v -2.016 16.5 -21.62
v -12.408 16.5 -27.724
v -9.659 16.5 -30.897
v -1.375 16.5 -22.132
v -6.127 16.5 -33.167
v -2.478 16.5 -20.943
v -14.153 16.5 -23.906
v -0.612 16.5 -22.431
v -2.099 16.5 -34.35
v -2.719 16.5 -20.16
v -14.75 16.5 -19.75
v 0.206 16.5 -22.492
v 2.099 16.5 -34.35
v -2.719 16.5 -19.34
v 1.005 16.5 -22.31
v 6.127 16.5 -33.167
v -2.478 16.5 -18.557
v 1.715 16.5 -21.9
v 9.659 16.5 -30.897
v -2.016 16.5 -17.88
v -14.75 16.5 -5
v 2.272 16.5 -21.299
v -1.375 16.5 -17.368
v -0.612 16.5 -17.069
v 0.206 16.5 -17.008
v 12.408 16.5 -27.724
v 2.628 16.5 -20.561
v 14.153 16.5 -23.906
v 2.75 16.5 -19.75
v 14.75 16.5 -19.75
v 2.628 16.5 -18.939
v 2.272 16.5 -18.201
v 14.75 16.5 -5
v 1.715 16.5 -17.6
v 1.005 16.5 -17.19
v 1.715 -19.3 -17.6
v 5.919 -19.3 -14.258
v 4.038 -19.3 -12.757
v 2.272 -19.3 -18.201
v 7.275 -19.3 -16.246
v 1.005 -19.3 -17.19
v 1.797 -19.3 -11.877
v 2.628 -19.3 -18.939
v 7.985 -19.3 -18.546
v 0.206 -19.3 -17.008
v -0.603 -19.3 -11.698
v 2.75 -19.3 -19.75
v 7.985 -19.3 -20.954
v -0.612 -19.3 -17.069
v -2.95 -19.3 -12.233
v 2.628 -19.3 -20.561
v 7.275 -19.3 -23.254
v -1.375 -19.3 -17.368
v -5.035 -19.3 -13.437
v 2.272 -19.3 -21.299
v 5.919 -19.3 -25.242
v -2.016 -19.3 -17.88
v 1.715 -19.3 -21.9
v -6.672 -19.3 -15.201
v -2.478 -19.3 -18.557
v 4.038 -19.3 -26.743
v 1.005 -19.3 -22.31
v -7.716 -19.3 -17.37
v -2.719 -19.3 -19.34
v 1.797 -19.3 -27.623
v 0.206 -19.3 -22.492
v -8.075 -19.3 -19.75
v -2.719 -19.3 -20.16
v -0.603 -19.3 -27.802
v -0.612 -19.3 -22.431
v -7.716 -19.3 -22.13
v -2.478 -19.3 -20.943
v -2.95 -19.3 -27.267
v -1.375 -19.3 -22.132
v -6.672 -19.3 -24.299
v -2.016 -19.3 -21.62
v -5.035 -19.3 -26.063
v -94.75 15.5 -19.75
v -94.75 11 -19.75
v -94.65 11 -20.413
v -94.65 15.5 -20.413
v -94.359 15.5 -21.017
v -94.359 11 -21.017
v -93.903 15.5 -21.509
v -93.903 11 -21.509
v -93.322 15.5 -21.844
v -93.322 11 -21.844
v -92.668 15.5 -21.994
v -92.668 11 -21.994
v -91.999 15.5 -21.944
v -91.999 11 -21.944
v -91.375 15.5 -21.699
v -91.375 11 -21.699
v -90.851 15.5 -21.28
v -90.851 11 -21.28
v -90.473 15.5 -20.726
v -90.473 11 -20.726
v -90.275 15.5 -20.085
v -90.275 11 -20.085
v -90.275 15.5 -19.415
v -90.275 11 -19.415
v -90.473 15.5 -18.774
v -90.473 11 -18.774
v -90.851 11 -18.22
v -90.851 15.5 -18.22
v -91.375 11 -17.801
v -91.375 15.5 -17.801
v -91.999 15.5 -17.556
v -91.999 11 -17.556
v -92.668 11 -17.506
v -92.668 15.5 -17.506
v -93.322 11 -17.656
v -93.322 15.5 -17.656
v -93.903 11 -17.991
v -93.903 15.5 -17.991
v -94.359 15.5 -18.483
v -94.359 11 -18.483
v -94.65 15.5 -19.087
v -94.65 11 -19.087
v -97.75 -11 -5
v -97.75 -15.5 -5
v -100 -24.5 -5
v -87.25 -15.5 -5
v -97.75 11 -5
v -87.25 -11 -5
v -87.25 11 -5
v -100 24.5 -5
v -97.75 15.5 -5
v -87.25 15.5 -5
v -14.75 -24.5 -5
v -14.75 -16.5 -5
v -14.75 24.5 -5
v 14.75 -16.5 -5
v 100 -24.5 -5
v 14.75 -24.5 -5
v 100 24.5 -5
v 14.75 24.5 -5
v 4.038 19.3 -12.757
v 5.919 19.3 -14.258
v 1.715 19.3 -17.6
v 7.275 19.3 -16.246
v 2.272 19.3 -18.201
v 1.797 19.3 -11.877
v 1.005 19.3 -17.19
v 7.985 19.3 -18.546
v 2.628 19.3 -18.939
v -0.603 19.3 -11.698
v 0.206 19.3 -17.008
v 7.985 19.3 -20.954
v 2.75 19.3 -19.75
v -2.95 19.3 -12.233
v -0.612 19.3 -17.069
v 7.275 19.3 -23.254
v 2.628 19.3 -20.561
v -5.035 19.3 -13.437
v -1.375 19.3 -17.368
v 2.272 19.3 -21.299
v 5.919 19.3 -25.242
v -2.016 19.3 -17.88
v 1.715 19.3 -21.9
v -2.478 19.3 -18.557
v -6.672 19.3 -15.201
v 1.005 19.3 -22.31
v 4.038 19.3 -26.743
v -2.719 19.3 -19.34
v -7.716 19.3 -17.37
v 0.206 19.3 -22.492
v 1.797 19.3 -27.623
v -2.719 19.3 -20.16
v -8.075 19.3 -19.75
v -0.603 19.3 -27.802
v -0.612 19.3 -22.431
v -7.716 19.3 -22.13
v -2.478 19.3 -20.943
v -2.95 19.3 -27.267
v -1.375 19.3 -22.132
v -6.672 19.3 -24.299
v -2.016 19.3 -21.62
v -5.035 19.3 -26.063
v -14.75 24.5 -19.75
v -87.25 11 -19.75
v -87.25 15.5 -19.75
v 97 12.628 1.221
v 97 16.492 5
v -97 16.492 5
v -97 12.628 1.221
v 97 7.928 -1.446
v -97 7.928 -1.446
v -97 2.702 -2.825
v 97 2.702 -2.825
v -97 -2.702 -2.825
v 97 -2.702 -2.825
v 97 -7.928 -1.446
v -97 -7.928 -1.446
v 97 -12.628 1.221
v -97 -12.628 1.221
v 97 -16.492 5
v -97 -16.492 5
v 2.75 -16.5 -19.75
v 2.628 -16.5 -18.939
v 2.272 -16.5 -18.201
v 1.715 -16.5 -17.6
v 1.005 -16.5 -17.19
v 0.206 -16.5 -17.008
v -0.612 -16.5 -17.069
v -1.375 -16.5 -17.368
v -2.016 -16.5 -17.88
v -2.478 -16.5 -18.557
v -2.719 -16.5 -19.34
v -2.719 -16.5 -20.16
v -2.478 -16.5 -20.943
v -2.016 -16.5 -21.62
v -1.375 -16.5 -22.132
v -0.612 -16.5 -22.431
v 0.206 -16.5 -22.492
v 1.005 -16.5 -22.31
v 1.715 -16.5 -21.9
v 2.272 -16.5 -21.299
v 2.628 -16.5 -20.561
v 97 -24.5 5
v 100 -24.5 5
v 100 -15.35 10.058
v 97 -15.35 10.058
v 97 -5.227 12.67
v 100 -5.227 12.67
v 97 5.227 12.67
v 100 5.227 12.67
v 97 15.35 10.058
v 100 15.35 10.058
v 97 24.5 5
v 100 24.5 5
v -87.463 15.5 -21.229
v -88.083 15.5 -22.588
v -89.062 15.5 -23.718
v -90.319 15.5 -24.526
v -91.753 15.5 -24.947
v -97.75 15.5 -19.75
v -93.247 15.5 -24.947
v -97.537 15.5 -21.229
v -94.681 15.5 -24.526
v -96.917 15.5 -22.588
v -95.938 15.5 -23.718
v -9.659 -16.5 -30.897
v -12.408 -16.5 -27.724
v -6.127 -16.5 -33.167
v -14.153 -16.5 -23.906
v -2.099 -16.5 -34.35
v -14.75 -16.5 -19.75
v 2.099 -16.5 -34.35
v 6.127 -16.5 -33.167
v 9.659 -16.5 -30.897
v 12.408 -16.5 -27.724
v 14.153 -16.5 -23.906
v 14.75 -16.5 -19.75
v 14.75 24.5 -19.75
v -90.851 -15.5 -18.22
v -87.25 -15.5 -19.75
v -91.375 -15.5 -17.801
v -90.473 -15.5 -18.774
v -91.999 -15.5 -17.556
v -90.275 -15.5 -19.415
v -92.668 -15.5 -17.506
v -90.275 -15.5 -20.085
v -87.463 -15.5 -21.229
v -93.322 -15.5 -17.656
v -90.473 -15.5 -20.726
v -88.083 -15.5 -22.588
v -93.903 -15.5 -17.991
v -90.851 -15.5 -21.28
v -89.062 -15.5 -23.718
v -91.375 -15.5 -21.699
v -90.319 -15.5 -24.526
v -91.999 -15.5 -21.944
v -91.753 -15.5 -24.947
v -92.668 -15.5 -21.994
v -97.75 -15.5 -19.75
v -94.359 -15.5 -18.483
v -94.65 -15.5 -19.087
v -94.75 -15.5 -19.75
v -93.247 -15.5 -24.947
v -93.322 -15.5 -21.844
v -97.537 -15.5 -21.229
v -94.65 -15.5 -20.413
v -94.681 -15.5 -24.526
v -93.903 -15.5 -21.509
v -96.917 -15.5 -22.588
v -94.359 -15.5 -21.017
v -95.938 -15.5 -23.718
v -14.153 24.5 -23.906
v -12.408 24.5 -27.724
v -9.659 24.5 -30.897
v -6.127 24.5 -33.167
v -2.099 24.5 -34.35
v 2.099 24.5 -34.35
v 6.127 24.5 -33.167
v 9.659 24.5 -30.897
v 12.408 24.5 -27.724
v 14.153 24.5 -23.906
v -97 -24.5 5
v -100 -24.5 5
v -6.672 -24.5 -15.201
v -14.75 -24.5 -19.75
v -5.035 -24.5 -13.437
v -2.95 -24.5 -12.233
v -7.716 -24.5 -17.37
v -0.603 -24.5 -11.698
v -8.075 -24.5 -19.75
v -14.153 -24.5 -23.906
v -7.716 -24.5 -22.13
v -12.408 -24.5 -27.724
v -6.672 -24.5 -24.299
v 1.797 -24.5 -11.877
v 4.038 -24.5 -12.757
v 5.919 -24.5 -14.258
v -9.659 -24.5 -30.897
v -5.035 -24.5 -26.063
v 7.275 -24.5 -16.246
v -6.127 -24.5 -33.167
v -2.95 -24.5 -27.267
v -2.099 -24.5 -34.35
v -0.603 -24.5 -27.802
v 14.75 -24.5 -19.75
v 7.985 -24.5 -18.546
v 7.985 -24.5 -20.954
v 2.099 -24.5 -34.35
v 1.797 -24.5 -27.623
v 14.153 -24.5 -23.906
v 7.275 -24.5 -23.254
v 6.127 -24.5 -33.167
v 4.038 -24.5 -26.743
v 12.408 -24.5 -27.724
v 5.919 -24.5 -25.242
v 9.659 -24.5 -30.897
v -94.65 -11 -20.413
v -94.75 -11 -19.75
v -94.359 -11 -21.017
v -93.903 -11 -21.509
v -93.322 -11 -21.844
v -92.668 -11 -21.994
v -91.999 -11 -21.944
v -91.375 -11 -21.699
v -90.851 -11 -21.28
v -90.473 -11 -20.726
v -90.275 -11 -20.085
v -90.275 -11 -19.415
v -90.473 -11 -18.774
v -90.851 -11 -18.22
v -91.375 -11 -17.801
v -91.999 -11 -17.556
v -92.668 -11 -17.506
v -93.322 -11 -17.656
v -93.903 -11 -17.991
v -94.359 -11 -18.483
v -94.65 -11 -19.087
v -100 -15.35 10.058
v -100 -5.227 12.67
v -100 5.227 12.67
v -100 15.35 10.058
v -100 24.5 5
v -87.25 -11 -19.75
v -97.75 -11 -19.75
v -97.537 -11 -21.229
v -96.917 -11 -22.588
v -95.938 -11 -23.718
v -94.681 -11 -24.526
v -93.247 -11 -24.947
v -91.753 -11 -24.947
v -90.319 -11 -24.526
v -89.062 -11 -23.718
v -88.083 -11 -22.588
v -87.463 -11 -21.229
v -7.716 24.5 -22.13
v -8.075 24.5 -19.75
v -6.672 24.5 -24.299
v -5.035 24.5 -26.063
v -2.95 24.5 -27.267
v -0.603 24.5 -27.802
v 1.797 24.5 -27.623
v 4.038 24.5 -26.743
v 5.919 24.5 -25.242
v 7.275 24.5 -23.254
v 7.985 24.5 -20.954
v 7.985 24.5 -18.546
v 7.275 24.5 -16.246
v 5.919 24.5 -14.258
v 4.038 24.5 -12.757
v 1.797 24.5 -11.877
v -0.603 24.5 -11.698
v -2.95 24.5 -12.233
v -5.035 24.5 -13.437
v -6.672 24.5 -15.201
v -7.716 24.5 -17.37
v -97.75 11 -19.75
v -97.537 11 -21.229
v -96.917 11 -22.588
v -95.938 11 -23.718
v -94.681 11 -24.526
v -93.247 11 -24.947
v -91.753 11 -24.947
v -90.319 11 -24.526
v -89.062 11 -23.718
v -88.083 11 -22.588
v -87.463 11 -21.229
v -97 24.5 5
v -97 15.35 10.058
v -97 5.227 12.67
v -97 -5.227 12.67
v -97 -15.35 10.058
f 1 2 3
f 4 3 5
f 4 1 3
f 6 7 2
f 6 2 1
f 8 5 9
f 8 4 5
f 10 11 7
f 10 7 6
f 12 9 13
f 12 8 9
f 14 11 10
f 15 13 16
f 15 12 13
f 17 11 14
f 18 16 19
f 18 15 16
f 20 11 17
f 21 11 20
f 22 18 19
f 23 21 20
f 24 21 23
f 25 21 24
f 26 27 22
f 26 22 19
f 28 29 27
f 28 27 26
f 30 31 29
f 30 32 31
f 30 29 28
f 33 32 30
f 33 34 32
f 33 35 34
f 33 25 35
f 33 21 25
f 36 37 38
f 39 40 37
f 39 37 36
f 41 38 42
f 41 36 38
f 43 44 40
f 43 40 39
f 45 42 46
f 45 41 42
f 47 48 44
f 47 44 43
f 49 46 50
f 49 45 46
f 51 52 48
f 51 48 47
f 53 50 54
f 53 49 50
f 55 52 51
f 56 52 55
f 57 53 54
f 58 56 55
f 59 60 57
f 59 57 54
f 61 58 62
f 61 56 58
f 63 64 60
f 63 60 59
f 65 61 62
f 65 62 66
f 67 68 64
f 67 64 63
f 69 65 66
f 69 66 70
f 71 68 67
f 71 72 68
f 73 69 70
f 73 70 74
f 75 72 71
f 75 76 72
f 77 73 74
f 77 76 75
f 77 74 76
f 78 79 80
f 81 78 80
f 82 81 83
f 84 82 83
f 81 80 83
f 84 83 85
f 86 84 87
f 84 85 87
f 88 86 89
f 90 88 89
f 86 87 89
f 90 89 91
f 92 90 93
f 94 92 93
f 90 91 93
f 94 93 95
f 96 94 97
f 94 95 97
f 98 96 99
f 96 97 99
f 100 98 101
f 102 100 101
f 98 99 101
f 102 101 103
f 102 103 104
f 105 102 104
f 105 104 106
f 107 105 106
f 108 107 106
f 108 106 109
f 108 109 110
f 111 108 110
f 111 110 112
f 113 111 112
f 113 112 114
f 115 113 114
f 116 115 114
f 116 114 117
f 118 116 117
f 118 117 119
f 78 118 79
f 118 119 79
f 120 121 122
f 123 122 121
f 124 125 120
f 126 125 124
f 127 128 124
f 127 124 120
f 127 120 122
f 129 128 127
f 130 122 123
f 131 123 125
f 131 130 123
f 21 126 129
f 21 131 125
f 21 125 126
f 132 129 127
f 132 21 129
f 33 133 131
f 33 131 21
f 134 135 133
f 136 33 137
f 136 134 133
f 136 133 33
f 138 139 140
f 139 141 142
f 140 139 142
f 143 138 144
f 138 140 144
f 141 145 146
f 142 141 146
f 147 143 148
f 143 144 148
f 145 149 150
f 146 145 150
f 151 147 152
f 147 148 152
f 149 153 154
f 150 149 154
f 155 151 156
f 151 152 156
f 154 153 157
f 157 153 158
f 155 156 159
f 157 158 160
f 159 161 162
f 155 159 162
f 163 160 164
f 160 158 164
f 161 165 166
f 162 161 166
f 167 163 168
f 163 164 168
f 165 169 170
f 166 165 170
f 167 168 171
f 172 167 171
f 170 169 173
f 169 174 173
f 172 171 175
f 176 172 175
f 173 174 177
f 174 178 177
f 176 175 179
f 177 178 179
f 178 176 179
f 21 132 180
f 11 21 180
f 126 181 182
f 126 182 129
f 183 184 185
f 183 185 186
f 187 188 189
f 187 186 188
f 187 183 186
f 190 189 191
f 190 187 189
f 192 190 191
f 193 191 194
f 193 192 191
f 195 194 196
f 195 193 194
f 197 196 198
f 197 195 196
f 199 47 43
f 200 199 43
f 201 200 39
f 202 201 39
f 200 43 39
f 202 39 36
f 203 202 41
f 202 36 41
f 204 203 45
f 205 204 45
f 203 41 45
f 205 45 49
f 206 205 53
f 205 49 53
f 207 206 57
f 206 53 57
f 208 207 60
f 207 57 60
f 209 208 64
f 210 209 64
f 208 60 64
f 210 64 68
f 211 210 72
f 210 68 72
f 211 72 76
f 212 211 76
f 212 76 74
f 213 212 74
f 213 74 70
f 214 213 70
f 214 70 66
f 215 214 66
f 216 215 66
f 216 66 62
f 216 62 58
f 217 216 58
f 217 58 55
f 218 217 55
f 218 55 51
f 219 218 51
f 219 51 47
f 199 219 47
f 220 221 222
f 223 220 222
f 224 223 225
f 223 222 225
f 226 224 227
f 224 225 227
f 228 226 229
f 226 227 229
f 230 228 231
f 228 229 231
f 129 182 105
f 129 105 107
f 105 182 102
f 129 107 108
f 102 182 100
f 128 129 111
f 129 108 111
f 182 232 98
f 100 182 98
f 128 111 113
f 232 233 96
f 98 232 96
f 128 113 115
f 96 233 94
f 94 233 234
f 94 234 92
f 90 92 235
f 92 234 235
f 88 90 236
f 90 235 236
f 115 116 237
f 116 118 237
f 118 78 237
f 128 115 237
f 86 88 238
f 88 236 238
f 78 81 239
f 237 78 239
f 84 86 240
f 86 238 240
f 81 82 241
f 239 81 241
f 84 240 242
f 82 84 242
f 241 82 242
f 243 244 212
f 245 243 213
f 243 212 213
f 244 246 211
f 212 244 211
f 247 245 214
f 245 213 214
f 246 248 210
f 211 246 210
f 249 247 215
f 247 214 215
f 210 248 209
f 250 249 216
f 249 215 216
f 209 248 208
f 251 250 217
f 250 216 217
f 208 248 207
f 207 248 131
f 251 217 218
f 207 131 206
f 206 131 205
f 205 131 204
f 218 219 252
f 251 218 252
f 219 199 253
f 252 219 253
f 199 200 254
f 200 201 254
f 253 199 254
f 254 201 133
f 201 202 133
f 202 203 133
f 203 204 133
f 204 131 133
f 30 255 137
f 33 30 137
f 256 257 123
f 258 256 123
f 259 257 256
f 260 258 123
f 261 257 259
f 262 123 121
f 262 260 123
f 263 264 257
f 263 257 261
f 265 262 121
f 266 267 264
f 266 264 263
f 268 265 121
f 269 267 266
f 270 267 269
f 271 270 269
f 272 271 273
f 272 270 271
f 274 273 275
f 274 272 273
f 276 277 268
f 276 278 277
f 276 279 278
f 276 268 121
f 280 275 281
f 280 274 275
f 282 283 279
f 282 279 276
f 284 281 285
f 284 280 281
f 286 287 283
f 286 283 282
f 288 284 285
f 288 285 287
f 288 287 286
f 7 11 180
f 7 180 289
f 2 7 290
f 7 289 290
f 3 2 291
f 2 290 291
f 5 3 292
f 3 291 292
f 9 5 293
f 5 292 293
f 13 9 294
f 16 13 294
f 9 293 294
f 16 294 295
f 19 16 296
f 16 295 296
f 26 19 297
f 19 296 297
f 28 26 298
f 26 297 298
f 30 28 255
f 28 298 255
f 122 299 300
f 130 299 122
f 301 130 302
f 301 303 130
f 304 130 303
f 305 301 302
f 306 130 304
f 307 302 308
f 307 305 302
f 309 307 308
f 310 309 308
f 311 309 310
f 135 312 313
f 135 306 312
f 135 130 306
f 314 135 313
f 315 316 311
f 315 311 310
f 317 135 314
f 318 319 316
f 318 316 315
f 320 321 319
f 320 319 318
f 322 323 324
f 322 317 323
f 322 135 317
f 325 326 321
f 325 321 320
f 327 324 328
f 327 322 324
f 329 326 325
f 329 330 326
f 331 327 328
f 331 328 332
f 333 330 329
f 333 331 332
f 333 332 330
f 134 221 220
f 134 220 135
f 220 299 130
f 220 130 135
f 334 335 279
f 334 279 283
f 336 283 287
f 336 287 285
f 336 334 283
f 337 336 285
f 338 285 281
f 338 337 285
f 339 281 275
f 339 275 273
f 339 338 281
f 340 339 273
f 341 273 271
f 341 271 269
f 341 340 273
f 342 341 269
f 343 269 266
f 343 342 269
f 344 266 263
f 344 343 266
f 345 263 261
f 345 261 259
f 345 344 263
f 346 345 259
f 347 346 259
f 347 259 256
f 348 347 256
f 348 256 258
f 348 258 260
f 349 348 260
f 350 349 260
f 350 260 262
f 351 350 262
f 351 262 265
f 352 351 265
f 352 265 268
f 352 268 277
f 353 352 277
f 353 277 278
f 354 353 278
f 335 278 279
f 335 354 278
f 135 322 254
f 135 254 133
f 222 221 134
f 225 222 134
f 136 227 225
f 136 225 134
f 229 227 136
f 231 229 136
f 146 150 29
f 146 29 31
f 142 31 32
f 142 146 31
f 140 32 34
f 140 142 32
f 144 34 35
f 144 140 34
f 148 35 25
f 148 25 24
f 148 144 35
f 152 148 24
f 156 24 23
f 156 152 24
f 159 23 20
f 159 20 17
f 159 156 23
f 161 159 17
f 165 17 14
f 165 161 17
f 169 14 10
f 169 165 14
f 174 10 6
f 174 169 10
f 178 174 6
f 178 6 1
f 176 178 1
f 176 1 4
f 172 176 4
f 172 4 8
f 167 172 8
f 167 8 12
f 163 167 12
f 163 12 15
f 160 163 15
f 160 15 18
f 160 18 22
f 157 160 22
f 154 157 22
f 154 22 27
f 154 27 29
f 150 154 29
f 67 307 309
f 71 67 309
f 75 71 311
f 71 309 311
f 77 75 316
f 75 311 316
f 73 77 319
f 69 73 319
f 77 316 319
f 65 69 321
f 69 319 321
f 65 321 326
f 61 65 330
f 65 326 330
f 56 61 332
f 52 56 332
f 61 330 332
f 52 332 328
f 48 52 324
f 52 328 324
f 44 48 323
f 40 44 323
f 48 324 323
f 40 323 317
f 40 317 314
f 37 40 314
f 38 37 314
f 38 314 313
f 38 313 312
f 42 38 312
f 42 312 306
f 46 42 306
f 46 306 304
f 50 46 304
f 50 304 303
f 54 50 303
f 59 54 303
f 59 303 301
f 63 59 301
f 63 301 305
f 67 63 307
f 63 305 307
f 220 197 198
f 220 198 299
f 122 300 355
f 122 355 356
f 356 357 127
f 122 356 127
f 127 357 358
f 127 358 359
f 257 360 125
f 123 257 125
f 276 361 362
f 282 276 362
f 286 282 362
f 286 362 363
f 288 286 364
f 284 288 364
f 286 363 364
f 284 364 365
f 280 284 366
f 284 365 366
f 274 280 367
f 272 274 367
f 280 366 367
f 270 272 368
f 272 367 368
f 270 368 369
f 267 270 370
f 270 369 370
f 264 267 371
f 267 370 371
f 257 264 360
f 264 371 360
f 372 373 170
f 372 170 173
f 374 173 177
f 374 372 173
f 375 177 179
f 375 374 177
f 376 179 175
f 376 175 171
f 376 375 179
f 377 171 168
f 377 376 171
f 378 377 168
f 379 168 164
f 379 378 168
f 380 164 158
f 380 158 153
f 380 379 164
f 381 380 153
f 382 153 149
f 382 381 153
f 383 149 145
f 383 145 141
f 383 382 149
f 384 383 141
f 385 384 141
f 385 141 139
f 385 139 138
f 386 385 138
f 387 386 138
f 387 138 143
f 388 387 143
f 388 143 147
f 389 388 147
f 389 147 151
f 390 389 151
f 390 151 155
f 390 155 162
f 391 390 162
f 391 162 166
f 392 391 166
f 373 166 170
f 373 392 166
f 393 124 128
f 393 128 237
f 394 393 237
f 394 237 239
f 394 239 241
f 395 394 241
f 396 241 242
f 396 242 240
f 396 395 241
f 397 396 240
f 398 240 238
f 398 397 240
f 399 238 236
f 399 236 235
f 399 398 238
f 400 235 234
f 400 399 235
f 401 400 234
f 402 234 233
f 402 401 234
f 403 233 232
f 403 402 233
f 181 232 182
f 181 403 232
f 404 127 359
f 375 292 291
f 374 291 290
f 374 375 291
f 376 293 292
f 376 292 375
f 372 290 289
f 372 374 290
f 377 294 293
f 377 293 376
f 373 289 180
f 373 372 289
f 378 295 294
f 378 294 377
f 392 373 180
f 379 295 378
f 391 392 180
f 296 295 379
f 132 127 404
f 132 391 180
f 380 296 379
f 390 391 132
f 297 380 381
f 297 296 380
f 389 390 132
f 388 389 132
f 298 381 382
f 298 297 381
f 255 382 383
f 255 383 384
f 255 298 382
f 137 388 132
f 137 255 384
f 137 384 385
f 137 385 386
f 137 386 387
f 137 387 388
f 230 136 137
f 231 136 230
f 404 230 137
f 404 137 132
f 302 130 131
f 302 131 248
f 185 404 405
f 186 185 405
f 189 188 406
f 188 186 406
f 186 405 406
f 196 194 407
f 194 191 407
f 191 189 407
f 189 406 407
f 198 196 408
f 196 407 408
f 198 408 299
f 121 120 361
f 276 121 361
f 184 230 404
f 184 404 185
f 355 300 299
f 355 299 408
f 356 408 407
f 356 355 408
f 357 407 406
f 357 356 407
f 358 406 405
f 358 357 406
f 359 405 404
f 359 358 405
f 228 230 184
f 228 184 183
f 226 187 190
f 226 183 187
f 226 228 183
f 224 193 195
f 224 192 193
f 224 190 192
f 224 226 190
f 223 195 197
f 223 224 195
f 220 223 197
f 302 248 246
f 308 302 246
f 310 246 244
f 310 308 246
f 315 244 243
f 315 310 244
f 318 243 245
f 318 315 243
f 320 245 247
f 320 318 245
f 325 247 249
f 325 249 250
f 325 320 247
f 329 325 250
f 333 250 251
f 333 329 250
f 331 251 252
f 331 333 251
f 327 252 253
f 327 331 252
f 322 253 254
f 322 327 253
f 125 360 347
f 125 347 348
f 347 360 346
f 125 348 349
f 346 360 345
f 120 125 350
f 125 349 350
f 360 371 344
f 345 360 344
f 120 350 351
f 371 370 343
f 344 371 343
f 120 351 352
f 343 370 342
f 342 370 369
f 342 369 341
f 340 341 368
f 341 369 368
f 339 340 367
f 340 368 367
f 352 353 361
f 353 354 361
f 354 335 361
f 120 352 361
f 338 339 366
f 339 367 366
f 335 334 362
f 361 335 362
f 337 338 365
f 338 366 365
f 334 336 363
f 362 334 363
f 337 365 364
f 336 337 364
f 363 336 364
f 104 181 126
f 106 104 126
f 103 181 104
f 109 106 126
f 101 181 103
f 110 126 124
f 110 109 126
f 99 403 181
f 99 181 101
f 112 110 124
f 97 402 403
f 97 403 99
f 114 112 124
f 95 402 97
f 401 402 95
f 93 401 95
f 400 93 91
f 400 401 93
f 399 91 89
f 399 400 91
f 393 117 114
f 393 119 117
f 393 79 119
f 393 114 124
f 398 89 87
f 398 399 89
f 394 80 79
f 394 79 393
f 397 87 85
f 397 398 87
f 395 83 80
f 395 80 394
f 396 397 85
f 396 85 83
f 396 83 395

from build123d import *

# Parameters (mm, degrees)
BOSS_EXTRUDE1_DEPTH = 100
SKETCH3_R           = 14.75
SKETCH3_R_2         = 2.75
BOSS_EXTRUDE2_DEPTH = 8
SKETCH4_R           = 8.075
CUT_EXTRUDE1_DEPTH  = 5.2
BOSS_EXTRUDE5_START = 11
SKETCH6_R           = 2.25
BOSS_EXTRUDE5_DEPTH = 4.5
BOSS_EXTRUDE6_DEPTH = 3


with BuildPart() as part:
    # Sketch1 → Boss-Extrude1 (new body, symmetric)
    with BuildSketch(Plane.YZ):
        with BuildLine():
            Line((-24.5, 5), (-24.5, -5))
            Line((-24.5, -5), (24.5, -5))
            Line((24.5, -5), (24.5, 5))
            Line((24.5, 5), (16.492422502, 5))
            ThreePointArc((16.492422502, 5), (0, -3), (-16.492422502, 5))
            Line((-16.492422502, 5), (-24.5, 5))
        make_face()
    extrude(amount=BOSS_EXTRUDE1_DEPTH, both=True)

    # Sketch3 → Boss-Extrude2 (add)
    with BuildSketch(Plane.XZ.offset(24.5)):
        with Locations((0, -19.75)):
            Circle(SKETCH3_R)
        with Locations((0, -19.75)):
            Circle(SKETCH3_R_2, mode=Mode.SUBTRACT)
        with BuildLine():
            Line((-14.75, -5), (-14.75, -19.75))
            ThreePointArc((-14.75, -19.75), (-10.429825021, -9.320174976), (5e-09, -5))
            Line((5e-09, -5), (-14.75, -5))
        make_face()
        with BuildLine():
            ThreePointArc((5e-09, -5), (10.429825024, -9.320174979), (14.75, -19.75))
            Line((14.75, -19.75), (14.75, -5))
            Line((14.75, -5), (5e-09, -5))
        make_face()
    boss_extrude2 = extrude(amount=-BOSS_EXTRUDE2_DEPTH)

    # Sketch4 → Cut-Extrude1 (cut)
    with BuildSketch(Plane(origin=(0, -24.5, 0), x_dir=(-1, 0, 0), z_dir=(0, -1, 0))):
        with Locations((0, 19.75)):
            Circle(SKETCH4_R)
    cut_extrude1 = extrude(amount=-CUT_EXTRUDE1_DEPTH, mode=Mode.SUBTRACT)

    # Mirror1: Boss-Extrude2, Cut-Extrude1 across plane
    add(boss_extrude2.mirror(Plane(origin=(0, 0, 0), x_dir=(0, 0, 1), z_dir=(0, -1, 0))))
    add(cut_extrude1.mirror(Plane(origin=(0, 0, 0), x_dir=(0, 0, 1), z_dir=(0, -1, 0))), mode=Mode.SUBTRACT)

    # Sketch6 → Boss-Extrude5 (add)
    with BuildSketch(Plane(origin=(0, 0, 0), x_dir=(-1, 0, 0), z_dir=(0, -1, 0)).offset(BOSS_EXTRUDE5_START)):
        with BuildLine():
            Line((87.25, 19.75), (87.25, 5))
            Line((87.25, 5), (97.75, 5))
            Line((97.75, 5), (97.75, 19.75))
            ThreePointArc((97.75, 19.75), (92.5, 25), (87.25, 19.75))
        make_face()
        with Locations((92.5, 19.75)):
            Circle(SKETCH6_R, mode=Mode.SUBTRACT)
    boss_extrude5 = extrude(amount=BOSS_EXTRUDE5_DEPTH)

    # Mirror2: Boss-Extrude5 across plane
    add(boss_extrude5.mirror(Plane(origin=(0, 0, 0), x_dir=(0, 0, 1), z_dir=(0, -1, 0))))

    # Sketch7 → Boss-Extrude6 (add)
    with BuildSketch(Plane(origin=(-100, 0, 0), x_dir=(0, -1, 0), z_dir=(-1, 0, 0))):
        with BuildLine():
            Line((24.5, 5), (16.492422502, 5))
            ThreePointArc((16.492422502, 5), (0, -3), (-16.492422502, 5))
            Line((-16.492422502, 5), (-24.5, 5))
            Line((-24.5, 5), (-24.5, -5))
            Line((-24.5, -5), (24.5, -5))
            Line((24.5, -5), (24.5, 5))
        make_face()
        with BuildLine():
            Line((-16.492422502, 5), (16.492422502, 5))
            ThreePointArc((16.492422502, 5), (0, -3), (-16.492422502, 5))
        make_face()
        with BuildLine():
            ThreePointArc((24.5, 5), (0, 13), (-24.5, 5))
            Line((-24.5, 5), (-16.492422502, 5))
            Line((-16.492422502, 5), (16.492422502, 5))
            Line((16.492422502, 5), (24.5, 5))
        make_face()
    boss_extrude6 = extrude(amount=-BOSS_EXTRUDE6_DEPTH)

    # Mirror3: Boss-Extrude6 across plane
    add(boss_extrude6.mirror(Plane(origin=(0, 0, 0), x_dir=(0, 0, 1), z_dir=(1, 0, 0))))


solid = part.part
